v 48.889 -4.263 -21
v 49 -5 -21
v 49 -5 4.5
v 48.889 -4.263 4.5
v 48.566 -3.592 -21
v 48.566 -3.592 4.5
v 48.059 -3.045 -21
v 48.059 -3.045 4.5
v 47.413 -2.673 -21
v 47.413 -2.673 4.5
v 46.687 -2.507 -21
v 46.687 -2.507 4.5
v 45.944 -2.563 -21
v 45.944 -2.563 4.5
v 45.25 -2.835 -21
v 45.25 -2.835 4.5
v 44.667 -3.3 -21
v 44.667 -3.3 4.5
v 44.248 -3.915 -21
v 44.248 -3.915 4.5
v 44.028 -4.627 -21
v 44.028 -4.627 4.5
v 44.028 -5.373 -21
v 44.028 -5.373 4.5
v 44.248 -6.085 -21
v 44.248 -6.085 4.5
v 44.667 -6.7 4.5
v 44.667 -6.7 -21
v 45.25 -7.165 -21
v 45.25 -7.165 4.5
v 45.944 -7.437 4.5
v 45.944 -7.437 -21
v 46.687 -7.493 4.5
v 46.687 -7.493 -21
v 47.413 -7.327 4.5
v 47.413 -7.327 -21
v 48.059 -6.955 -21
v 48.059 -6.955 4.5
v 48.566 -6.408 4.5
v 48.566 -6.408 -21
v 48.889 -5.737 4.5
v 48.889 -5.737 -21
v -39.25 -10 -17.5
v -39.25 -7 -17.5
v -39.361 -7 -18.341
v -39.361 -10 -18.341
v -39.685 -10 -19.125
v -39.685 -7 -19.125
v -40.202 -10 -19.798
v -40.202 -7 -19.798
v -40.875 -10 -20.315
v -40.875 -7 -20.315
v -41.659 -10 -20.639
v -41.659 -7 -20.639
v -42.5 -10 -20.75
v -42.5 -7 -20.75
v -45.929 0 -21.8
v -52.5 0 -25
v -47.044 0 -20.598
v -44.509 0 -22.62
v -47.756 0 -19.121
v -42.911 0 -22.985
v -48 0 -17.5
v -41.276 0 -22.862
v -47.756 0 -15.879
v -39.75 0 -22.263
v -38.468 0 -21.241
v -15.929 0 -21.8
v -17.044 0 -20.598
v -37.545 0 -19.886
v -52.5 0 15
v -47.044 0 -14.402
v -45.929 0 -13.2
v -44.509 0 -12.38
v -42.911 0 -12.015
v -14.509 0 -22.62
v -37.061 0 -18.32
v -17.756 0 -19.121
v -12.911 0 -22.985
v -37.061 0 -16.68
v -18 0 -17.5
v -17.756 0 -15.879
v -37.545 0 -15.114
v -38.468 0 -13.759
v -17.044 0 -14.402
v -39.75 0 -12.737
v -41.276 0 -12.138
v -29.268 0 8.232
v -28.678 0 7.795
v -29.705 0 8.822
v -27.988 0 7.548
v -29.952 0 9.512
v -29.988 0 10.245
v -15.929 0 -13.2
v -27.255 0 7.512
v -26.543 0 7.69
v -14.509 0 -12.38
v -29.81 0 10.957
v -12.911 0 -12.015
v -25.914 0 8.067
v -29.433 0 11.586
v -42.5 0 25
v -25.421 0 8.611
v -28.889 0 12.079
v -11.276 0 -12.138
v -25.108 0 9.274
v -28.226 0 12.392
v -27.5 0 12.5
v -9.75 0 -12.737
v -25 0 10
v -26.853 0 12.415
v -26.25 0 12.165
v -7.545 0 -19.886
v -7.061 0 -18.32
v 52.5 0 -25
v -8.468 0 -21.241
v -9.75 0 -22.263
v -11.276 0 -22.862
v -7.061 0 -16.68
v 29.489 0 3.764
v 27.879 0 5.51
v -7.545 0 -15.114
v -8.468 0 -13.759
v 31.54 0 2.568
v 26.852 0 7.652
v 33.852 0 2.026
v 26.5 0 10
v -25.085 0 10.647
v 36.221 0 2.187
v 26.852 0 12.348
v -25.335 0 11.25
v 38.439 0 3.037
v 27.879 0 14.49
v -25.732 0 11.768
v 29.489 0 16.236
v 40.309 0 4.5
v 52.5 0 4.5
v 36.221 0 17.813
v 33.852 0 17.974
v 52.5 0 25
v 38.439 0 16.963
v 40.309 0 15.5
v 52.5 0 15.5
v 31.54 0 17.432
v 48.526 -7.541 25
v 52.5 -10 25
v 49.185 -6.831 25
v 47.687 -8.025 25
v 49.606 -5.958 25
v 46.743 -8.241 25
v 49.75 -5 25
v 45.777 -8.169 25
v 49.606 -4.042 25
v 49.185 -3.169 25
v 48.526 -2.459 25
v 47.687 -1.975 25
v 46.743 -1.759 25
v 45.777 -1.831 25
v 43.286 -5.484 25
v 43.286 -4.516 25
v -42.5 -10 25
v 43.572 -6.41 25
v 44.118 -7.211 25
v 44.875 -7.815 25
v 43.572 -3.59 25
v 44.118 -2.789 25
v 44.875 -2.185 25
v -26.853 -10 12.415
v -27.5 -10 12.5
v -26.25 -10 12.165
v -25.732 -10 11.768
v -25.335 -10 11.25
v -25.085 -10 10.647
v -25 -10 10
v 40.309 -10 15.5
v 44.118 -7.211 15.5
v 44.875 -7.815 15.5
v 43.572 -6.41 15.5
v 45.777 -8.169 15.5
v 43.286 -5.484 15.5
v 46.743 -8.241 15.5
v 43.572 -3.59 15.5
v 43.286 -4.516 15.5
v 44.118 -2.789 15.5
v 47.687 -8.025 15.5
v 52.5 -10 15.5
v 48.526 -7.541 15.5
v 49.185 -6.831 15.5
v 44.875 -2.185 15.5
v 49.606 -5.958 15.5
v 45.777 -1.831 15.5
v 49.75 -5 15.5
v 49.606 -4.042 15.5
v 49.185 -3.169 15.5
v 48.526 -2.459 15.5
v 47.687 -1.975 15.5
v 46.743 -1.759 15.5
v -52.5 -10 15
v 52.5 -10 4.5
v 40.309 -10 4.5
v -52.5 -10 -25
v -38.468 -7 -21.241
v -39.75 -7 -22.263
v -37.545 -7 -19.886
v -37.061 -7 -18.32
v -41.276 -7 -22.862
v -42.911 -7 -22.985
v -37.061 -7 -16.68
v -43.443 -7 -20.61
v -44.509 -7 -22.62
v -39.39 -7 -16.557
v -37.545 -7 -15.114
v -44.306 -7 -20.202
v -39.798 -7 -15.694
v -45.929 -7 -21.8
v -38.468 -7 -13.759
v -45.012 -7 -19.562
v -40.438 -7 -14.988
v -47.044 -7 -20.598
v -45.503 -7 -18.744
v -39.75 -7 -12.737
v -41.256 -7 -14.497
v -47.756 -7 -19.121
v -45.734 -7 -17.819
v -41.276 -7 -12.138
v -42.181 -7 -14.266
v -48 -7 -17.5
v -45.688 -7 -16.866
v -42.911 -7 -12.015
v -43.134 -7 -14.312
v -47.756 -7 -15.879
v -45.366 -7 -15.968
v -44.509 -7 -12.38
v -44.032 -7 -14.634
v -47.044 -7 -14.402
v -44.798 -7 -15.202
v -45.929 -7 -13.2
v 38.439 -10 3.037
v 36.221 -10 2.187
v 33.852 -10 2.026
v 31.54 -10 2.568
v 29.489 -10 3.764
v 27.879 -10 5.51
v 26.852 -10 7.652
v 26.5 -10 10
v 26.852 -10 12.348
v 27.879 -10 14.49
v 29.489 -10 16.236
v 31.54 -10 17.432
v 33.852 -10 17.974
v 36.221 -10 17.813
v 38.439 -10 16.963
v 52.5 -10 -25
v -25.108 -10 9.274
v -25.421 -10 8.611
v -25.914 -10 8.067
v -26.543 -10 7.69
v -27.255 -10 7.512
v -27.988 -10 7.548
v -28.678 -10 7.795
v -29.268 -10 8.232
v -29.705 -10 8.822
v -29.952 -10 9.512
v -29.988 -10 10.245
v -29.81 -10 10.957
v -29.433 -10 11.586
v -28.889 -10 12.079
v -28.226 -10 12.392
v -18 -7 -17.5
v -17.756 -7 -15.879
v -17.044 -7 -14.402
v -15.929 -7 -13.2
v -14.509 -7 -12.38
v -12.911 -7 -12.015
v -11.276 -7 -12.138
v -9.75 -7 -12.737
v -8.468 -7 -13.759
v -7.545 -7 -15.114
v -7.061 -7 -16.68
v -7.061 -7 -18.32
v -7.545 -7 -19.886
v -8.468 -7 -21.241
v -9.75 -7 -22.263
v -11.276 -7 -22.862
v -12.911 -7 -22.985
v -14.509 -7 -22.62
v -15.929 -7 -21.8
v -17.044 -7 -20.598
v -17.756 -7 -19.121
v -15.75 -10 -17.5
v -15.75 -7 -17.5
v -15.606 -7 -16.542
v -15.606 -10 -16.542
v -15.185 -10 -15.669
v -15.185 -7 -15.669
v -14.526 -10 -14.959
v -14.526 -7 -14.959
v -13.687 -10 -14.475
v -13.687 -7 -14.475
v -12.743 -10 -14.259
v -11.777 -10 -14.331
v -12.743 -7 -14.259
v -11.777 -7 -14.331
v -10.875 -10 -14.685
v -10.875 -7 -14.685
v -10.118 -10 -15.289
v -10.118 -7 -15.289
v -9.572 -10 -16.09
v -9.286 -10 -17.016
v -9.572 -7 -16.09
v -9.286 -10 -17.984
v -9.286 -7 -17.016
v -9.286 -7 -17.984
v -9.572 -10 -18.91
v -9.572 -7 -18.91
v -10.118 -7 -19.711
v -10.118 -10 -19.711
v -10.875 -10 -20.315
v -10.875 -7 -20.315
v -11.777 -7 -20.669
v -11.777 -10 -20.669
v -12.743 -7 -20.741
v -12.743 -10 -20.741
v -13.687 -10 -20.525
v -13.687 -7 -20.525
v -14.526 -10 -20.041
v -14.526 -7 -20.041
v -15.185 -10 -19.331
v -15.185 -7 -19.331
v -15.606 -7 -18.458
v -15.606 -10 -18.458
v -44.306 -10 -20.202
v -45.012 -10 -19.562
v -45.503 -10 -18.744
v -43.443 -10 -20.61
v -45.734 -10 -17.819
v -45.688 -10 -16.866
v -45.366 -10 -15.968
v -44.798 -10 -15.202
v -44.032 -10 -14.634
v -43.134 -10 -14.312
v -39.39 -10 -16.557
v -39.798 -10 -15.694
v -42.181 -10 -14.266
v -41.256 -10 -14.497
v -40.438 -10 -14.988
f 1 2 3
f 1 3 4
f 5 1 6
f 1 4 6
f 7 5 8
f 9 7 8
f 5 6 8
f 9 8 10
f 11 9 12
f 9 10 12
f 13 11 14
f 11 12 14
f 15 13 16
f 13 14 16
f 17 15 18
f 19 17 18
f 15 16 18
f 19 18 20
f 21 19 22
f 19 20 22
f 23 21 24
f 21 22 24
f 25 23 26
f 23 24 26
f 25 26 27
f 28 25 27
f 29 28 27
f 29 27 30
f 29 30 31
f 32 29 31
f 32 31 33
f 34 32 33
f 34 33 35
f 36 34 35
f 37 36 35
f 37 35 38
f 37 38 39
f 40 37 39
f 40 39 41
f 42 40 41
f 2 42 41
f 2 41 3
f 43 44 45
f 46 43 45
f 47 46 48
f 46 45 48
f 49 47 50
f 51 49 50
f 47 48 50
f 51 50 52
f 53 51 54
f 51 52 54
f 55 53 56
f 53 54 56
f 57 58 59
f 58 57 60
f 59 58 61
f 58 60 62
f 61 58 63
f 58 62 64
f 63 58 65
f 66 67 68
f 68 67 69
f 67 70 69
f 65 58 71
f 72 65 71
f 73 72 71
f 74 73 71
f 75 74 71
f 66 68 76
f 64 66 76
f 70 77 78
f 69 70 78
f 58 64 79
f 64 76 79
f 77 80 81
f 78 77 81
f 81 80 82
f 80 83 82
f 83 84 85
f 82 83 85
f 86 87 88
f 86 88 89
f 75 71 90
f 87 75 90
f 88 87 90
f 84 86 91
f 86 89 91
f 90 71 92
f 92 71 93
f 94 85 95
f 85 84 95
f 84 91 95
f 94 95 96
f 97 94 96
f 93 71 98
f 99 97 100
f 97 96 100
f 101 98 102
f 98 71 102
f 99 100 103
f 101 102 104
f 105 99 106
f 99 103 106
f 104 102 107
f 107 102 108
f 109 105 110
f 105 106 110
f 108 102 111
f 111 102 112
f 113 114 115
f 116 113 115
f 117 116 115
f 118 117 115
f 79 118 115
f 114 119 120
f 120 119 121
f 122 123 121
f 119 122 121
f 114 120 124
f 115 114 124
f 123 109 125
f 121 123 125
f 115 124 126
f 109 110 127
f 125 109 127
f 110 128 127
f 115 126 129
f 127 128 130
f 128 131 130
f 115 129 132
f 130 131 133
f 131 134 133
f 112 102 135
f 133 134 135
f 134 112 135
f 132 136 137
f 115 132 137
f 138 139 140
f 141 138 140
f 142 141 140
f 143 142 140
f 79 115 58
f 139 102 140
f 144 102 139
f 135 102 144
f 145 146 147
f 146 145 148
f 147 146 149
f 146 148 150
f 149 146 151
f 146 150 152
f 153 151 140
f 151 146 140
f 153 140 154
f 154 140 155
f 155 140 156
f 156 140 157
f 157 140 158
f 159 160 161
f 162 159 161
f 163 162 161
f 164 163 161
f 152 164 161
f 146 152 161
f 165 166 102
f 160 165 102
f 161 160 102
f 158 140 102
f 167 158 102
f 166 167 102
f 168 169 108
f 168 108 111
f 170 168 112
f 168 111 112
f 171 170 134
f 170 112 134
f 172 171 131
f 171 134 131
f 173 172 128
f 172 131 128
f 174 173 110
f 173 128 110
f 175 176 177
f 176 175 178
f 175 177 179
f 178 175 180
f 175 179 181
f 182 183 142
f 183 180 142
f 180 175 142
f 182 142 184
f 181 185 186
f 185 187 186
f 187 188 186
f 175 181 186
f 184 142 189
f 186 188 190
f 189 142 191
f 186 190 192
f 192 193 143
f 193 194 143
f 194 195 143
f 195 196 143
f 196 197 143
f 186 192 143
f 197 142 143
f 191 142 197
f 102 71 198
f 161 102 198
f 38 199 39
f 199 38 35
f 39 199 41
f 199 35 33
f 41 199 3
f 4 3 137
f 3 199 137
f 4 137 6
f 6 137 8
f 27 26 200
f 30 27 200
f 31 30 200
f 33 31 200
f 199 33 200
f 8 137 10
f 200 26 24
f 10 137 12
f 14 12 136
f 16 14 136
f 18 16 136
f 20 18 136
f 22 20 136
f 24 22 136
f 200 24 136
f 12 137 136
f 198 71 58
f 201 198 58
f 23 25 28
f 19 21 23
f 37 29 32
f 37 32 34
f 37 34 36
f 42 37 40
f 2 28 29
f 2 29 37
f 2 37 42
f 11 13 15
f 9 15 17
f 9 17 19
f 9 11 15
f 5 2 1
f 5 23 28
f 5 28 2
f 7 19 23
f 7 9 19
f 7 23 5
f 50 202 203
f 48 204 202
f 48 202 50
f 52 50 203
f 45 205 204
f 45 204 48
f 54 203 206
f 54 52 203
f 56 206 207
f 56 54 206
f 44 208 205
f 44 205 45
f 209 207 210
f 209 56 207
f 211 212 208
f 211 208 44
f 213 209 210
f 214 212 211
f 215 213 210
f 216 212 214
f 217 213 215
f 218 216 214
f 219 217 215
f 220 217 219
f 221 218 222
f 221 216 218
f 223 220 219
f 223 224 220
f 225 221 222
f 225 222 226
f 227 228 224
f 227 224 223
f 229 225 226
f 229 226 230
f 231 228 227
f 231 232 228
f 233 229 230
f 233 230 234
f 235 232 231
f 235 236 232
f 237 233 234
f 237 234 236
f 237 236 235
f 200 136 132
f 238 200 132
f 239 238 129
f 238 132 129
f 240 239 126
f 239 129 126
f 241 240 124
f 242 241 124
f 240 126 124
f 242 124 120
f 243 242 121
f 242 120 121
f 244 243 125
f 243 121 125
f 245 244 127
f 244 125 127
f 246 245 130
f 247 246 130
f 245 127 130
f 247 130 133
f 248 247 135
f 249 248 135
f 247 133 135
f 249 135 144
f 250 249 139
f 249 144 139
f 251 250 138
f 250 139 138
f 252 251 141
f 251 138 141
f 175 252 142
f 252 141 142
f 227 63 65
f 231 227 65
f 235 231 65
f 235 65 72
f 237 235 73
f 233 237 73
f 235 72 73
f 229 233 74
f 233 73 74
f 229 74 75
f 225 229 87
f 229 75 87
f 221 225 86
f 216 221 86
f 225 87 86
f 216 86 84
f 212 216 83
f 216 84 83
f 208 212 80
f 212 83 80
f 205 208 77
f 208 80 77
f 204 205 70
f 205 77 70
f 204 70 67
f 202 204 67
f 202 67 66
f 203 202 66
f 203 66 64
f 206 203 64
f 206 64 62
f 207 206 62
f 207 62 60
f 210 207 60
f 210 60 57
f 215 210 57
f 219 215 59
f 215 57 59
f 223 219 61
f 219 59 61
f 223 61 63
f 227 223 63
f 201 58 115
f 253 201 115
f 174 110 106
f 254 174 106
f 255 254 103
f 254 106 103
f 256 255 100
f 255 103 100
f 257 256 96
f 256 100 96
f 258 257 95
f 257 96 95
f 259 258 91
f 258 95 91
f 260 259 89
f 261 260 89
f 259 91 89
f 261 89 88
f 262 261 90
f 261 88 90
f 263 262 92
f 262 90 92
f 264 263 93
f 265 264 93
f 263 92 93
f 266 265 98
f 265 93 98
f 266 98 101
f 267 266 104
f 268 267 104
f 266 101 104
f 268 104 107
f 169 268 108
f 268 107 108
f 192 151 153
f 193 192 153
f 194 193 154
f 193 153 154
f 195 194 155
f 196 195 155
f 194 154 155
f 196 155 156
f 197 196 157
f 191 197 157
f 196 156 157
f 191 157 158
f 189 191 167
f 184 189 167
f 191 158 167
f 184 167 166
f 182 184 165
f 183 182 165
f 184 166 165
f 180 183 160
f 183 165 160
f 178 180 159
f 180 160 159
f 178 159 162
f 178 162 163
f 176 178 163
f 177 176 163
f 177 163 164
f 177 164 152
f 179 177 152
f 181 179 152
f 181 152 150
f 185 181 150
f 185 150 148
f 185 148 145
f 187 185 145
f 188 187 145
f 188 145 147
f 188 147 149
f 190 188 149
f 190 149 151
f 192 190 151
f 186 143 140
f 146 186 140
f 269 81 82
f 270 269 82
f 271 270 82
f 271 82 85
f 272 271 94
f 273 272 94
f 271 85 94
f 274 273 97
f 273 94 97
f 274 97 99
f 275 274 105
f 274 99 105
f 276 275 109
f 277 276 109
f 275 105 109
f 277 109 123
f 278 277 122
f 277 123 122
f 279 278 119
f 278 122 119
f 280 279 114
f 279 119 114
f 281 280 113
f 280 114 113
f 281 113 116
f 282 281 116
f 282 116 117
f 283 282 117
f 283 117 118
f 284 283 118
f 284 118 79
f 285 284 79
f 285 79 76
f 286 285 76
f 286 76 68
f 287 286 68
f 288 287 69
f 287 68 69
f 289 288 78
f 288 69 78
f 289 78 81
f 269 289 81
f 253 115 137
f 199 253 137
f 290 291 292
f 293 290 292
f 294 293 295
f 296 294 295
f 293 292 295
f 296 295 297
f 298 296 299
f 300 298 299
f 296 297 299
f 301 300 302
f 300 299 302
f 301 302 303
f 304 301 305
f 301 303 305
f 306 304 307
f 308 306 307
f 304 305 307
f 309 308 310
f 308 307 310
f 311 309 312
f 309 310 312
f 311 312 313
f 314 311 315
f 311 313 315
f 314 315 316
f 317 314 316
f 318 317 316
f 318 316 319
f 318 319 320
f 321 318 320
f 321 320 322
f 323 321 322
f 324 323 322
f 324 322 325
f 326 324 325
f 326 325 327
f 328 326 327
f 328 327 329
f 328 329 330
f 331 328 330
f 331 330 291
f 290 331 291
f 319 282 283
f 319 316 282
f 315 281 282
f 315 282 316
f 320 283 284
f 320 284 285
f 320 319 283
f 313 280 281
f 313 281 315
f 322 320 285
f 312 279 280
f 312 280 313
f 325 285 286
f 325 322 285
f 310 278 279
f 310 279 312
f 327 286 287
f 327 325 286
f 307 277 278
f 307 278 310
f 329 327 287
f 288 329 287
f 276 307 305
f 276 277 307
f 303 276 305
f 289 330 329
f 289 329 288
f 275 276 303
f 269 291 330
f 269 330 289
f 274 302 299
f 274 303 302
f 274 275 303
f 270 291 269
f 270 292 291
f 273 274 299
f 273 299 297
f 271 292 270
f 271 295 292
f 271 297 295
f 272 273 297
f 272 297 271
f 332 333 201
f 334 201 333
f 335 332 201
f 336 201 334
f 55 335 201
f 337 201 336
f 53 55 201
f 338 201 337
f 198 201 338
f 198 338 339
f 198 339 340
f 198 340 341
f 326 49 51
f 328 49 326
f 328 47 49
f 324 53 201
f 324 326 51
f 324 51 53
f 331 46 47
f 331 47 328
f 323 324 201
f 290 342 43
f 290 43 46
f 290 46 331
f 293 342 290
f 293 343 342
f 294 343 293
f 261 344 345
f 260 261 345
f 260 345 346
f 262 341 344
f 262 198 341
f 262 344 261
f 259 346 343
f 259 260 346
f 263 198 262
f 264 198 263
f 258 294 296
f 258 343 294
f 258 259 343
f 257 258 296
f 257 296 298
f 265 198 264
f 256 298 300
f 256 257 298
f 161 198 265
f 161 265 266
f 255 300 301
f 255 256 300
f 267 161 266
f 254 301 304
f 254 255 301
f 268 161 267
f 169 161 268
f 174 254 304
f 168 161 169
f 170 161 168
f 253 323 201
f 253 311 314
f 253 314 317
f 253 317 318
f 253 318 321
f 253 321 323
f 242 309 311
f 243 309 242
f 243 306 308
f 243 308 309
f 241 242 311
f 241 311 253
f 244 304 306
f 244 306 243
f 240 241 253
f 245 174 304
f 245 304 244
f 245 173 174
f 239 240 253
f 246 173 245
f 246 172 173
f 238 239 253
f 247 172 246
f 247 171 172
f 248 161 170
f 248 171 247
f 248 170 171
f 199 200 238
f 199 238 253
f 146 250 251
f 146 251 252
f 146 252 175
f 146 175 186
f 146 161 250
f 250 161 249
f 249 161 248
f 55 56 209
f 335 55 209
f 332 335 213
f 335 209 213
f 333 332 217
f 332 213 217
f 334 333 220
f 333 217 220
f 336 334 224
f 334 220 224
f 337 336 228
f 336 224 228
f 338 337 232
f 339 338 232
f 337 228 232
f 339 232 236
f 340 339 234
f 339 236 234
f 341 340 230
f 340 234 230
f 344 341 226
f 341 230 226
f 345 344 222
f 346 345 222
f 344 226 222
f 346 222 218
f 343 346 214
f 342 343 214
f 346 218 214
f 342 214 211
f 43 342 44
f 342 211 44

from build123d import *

# Parameters (mm, degrees)
F1_DEPTH = 10
F2_SIZE  = 10
F3_R     = 5.5
F4_DEPTH = 7
F5_R     = 3.25
F6_DEPTH = 15
F7_R     = 2.5
F8_DEPTH = 46


with BuildPart() as f1:
    # F0 (on Front) → F1 (new body)
    with BuildSketch(Plane.XZ):
        with BuildLine():
            Line((-52.5, 25), (-52.5, -25))
            Line((-52.5, -25), (-42.5, -25))
            Line((-42.5, -25), (52.5, -25))
            Line((52.5, -25), (52.5, 4.5))
            Line((52.5, 4.5), (47.240064, 4.5))
            Line((47.240064, 4.5), (40.309475, 4.5))
            ThreePointArc((40.309475, 4.5), (26.5, 10), (40.309475, 15.5))
            Line((40.309475, 15.5), (47.240064, 15.5))
            Line((47.240064, 15.5), (52.5, 15.5))
            Line((52.5, 15.5), (52.5, 25))
            Line((52.5, 25), (-27.5, 25))
            Line((-27.5, 25), (-52.5, 25))
        make_face()
        with BuildLine():
            ThreePointArc((-39.25, -17.5), (-40.201903, -19.798097), (-42.5, -20.75))
            ThreePointArc((-42.5, -20.75), (-44.798097, -15.201903), (-39.25, -17.5))
        make_face(mode=Mode.SUBTRACT)
        with BuildLine():
            ThreePointArc((-9.25, -17.5), (-12.5, -20.75), (-15.75, -17.5))
            ThreePointArc((-15.75, -17.5), (-12.5, -14.25), (-9.25, -17.5))
        make_face(mode=Mode.SUBTRACT)
        with BuildLine():
            ThreePointArc((-25, 10), (-29.267767, 8.232233), (-27.5, 12.5))
            ThreePointArc((-27.5, 12.5), (-25.732233, 11.767767), (-25, 10))
        make_face(mode=Mode.SUBTRACT)
    extrude(amount=F1_DEPTH)

    # F2
    f2_edges = [f1.edges().sort_by_distance(p)[0] for p in [
        (-52.5, -5, 25),
    ]]
    chamfer(f2_edges, length=F2_SIZE)

    # F3 (on face) → F4 (cut)
    with BuildSketch(Plane(origin=(0, 0, 0), x_dir=(-1, 0, 0), z_dir=(0, 1, 0))):
        with Locations((12.5, -17.5)):
            Circle(F3_R)
        with Locations((42.5, -17.5)):
            Circle(F3_R)
    extrude(amount=-F4_DEPTH, mode=Mode.SUBTRACT)

    # F5 (on face) → F6 (cut)
    with BuildSketch(Plane.XY.offset(25)):
        with Locations((46.5, -5)):
            Circle(F5_R)
    extrude(amount=-F6_DEPTH, mode=Mode.SUBTRACT)

    # F7 (on face) → F8 (cut)
    with BuildSketch(Plane.XY.offset(25)):
        with Locations((46.5, -5)):
            Circle(F7_R)
    extrude(amount=-F8_DEPTH, mode=Mode.SUBTRACT)


solid = f1.part
